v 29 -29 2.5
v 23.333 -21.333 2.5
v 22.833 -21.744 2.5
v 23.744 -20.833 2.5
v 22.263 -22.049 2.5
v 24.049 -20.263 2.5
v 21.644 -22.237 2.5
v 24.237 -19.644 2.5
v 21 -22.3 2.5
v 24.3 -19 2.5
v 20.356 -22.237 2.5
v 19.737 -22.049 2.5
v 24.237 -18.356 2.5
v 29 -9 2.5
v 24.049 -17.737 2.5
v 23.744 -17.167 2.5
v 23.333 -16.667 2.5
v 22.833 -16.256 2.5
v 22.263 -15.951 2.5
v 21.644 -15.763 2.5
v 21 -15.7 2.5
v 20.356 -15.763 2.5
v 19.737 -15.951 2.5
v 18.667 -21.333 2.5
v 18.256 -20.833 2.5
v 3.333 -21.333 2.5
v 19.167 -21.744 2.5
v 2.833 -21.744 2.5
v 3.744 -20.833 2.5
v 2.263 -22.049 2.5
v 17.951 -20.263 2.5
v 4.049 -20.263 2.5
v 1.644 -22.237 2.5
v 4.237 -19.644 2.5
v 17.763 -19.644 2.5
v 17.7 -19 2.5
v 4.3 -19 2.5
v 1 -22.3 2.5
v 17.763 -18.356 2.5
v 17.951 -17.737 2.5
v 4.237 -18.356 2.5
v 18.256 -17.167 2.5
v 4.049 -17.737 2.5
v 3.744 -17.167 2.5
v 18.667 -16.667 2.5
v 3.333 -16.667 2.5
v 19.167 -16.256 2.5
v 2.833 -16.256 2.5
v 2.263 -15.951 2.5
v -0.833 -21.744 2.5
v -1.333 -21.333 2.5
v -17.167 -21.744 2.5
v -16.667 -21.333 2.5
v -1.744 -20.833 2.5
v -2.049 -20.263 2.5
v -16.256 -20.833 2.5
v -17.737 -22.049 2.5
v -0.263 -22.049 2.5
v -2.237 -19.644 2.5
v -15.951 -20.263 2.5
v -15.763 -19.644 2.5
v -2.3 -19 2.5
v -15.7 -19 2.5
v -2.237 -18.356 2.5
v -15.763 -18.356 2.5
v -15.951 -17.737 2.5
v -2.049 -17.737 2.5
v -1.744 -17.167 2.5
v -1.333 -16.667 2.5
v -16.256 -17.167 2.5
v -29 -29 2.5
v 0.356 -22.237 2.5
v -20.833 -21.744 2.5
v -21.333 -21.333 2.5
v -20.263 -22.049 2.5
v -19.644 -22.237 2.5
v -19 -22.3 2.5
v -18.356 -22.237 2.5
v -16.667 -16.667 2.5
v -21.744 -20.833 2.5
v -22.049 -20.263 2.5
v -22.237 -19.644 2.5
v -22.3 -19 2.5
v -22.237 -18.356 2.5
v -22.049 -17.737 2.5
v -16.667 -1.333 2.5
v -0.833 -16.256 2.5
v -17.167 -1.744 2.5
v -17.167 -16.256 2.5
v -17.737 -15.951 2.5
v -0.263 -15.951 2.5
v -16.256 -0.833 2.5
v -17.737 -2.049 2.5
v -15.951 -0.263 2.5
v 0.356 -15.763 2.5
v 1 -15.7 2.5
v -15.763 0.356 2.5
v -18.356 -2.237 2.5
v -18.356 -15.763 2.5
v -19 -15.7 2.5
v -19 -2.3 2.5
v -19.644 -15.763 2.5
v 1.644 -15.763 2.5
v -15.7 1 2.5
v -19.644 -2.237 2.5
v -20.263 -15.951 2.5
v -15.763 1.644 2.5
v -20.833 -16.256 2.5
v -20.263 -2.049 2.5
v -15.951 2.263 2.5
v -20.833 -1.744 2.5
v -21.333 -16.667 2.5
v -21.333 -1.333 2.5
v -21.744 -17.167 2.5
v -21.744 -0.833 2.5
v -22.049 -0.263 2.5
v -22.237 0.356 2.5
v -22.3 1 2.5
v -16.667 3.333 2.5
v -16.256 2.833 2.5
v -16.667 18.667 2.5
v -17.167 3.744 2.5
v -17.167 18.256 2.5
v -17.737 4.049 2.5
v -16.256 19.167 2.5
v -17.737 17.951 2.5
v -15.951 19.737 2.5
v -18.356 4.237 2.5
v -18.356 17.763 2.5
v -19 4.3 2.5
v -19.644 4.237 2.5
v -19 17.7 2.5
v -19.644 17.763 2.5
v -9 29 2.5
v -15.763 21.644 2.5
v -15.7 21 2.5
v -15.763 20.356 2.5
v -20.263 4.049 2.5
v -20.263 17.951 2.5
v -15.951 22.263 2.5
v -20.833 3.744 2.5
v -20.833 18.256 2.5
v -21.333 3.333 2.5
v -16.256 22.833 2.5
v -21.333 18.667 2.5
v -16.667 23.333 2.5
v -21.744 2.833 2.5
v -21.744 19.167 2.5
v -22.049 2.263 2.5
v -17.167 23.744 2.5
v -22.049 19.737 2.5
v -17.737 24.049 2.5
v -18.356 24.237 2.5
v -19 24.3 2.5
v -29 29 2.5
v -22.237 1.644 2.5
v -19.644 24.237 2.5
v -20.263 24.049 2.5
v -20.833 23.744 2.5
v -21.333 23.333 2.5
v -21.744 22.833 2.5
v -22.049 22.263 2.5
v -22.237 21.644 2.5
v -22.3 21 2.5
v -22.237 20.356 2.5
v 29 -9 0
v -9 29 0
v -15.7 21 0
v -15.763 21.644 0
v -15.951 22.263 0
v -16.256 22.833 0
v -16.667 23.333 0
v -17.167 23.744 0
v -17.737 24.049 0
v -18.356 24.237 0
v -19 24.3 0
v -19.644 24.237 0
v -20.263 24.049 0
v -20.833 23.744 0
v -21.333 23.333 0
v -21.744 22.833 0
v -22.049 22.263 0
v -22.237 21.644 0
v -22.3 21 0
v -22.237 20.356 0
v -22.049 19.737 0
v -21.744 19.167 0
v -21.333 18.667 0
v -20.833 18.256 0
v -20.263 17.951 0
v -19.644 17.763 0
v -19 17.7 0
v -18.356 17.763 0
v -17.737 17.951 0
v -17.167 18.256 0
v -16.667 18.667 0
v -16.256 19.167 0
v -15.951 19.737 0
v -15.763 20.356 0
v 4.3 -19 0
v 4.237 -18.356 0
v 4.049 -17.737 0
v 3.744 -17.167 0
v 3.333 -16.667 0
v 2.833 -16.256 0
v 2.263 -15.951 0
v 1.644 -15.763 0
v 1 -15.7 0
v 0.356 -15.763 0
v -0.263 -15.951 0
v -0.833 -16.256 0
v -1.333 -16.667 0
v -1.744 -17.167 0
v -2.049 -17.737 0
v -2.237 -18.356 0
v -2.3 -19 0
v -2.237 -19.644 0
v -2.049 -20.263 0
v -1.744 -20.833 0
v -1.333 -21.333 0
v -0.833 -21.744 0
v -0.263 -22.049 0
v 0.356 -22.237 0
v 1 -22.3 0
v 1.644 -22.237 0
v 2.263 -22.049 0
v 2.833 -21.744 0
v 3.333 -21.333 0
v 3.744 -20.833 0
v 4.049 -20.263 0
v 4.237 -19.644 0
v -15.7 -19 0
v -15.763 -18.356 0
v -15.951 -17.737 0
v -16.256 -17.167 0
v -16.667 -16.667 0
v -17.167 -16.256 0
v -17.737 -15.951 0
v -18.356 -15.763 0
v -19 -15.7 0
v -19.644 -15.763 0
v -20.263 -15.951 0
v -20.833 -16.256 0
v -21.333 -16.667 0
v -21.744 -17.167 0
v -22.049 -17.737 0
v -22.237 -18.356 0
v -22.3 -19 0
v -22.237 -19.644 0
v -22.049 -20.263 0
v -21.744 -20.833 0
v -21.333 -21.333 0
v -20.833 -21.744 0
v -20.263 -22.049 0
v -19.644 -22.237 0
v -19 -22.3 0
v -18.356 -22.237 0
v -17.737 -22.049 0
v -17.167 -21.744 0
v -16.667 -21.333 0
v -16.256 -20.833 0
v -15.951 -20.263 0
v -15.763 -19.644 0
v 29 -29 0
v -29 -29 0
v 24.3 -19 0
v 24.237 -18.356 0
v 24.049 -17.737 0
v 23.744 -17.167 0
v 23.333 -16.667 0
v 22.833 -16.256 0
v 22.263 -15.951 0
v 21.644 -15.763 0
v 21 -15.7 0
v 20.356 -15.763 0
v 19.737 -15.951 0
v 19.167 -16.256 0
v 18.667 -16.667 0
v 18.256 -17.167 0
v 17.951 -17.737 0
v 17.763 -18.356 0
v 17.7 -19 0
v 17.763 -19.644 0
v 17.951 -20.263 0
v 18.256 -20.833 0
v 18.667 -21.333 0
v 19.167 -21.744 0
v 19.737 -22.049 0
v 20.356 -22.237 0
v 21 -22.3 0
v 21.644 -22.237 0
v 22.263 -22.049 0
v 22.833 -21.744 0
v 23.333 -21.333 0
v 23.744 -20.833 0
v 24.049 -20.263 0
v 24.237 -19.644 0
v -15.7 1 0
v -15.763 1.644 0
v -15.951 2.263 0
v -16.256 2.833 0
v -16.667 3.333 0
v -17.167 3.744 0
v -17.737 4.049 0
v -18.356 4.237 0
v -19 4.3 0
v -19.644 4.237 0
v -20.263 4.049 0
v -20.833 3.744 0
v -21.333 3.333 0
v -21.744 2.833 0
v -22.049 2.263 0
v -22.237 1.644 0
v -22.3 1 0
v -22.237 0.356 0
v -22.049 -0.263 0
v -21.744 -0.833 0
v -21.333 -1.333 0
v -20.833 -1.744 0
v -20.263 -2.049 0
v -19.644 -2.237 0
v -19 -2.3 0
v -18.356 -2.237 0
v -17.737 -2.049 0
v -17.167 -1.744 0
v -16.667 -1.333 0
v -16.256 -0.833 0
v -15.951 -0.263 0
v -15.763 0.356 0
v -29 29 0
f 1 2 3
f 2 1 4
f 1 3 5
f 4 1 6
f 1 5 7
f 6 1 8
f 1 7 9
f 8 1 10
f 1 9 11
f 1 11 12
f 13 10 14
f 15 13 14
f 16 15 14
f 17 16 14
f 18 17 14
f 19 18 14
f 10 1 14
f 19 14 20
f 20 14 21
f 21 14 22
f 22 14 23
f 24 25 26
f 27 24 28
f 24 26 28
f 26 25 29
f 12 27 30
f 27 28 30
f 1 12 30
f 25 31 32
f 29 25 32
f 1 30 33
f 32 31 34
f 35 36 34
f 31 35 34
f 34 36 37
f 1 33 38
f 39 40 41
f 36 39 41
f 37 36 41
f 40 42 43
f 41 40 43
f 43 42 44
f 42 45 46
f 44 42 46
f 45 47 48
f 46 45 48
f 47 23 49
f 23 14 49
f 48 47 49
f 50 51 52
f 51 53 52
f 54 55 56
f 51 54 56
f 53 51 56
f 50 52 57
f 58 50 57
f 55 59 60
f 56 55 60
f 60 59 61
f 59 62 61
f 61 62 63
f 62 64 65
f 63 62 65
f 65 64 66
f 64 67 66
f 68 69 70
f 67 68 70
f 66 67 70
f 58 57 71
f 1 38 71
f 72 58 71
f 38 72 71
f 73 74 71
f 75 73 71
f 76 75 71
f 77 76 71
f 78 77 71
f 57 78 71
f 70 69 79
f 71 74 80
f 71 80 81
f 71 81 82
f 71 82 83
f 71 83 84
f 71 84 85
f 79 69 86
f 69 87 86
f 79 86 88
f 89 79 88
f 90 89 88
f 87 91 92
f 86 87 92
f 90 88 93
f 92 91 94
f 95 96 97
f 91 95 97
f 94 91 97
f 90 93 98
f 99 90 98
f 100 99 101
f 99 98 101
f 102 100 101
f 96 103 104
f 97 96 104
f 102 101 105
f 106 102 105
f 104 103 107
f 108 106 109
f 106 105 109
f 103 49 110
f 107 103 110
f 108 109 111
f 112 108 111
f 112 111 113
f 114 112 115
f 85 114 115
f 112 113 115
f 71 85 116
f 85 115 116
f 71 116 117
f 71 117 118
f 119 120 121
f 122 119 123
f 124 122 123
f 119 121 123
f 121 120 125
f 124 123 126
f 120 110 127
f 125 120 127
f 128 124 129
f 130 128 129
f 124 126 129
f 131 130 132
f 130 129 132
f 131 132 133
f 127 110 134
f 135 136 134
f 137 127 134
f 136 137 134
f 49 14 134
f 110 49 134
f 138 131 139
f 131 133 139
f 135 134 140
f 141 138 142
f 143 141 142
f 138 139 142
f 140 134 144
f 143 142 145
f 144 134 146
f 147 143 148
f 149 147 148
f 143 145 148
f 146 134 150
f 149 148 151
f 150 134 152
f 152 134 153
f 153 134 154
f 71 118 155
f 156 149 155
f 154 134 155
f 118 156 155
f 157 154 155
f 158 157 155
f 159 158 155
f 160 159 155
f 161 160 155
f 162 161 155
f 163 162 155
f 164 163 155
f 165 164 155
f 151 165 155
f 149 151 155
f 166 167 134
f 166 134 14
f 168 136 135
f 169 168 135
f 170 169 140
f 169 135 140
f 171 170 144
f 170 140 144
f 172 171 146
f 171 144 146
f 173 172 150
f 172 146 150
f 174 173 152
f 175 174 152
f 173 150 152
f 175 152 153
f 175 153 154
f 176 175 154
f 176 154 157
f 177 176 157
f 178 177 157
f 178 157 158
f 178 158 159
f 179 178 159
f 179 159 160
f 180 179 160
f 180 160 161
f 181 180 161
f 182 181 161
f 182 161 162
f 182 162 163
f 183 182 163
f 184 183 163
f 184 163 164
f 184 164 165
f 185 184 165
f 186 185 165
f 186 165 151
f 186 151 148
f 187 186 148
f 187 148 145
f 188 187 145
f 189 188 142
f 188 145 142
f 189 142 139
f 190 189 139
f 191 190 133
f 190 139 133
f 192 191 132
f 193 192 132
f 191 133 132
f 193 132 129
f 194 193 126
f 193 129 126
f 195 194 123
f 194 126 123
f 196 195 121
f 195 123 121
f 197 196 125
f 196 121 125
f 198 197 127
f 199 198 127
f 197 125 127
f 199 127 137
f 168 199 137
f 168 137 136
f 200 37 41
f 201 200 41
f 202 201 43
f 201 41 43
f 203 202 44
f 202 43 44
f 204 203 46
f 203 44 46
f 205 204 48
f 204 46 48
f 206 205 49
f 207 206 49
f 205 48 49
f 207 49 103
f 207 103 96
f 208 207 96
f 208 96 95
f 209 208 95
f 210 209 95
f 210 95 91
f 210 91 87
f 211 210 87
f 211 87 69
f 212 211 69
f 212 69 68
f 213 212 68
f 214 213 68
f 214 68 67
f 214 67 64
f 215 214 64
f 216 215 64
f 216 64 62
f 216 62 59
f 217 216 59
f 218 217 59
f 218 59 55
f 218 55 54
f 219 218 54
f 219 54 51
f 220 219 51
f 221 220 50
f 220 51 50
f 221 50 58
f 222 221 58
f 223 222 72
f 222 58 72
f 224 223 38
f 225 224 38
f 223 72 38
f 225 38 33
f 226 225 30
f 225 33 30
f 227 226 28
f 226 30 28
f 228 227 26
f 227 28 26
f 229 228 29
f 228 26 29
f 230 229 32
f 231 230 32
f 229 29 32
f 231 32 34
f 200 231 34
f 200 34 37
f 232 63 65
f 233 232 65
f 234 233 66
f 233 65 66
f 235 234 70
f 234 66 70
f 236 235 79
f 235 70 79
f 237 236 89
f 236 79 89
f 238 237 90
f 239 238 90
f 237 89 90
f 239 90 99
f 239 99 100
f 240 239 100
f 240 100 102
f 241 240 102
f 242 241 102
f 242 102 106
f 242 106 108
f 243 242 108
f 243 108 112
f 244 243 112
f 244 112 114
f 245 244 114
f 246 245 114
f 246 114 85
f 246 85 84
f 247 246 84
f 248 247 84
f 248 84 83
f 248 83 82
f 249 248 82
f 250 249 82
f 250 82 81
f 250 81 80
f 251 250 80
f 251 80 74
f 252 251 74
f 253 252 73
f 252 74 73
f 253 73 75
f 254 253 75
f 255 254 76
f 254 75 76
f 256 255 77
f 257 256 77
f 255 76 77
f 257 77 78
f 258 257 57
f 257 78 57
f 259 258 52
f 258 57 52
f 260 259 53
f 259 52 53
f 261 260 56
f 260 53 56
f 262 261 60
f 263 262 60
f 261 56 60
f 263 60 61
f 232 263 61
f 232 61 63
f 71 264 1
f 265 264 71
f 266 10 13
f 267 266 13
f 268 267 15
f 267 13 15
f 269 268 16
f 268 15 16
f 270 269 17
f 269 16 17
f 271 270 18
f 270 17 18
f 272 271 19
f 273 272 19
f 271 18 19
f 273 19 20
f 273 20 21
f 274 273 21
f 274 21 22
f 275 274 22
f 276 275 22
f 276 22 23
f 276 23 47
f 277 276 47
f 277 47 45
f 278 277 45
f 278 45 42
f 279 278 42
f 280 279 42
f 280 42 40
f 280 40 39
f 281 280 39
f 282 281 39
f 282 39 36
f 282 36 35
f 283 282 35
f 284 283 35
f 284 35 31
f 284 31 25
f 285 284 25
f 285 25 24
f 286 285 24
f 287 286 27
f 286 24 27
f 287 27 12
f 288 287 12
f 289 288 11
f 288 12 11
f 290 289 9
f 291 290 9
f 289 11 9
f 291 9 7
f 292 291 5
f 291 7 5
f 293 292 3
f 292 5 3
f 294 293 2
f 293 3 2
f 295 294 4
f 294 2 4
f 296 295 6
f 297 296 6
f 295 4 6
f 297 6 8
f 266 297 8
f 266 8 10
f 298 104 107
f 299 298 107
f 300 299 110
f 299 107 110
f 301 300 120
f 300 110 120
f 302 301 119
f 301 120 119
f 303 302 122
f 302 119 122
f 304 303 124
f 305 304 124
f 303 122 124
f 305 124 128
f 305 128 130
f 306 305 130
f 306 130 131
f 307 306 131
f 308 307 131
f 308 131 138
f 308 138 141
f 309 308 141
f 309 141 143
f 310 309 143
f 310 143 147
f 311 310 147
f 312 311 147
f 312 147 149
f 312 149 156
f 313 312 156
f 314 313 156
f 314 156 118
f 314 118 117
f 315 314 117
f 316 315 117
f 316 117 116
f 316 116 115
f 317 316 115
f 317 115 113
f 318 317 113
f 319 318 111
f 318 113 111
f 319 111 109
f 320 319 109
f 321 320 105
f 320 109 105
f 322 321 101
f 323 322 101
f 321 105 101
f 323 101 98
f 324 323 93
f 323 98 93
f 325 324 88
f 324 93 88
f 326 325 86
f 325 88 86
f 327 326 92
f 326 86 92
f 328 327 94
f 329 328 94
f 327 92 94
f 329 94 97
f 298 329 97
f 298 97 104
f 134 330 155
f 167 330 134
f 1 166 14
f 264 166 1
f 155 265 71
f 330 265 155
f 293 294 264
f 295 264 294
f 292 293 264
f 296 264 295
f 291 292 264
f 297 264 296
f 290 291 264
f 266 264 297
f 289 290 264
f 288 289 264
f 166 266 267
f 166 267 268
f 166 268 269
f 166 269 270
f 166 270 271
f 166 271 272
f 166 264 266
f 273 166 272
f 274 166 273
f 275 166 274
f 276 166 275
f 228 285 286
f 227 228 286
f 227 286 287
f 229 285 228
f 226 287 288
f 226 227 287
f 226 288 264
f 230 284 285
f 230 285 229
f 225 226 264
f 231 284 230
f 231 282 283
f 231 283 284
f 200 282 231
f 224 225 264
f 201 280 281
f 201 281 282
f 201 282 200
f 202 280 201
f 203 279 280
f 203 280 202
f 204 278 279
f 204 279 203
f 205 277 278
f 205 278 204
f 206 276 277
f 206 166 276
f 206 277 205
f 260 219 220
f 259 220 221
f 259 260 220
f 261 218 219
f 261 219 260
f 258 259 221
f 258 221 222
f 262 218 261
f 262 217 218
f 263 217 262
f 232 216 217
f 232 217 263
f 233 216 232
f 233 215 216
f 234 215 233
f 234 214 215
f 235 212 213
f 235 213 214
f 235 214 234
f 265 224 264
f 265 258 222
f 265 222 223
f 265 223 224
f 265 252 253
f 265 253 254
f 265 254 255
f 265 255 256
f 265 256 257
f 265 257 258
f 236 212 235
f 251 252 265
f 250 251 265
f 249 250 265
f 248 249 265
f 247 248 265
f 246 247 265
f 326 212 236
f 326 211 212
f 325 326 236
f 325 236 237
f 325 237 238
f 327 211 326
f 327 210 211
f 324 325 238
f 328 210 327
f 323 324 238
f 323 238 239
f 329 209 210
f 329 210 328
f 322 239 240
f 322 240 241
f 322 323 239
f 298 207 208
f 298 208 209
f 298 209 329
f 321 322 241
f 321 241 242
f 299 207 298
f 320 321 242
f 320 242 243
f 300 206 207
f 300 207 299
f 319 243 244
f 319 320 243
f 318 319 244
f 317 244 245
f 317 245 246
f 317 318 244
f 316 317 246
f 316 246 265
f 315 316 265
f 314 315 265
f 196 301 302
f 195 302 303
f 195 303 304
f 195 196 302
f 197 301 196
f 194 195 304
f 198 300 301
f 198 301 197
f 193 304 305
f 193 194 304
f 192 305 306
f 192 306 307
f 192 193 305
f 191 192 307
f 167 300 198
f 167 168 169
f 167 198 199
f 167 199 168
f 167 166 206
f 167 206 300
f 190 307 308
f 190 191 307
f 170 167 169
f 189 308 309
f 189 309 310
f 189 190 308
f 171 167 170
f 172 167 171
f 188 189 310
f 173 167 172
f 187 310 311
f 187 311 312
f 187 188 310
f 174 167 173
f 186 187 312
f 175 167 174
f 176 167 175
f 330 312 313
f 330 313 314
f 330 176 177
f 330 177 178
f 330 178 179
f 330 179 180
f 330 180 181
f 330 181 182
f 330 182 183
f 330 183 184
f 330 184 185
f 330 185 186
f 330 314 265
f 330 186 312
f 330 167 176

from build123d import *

# Parameters (mm, degrees)
BOSS_EXTRUDE1_DEPTH = 2.5
SKETCH2_R           = 3.3
CUT_EXTRUDE1_DEPTH  = 3.5
LPATTERN1_COUNT     = 3
LPATTERN1_PITCH     = 20
LPATTERN2_COUNT     = 3
LPATTERN2_PITCH     = 20


with BuildPart() as part:
    # Sketch1 → Boss-Extrude1 (new body)
    with BuildSketch(Plane.XY):
        Polygon((-9, 29), (29, -9), (29, -29), (-29, -29), (-29, 29), align=None)
    extrude(amount=BOSS_EXTRUDE1_DEPTH)

    # Sketch2 → Cut-Extrude1 (cut, through all)
    with BuildSketch(Plane.XY.offset(2.5)):
        with Locations((-19, -19)):
            Circle(SKETCH2_R)
    cut_extrude1 = extrude(amount=-CUT_EXTRUDE1_DEPTH, mode=Mode.SUBTRACT)

    # LPattern1: Cut-Extrude1 ×3
    with Locations(*[(i * LPATTERN1_PITCH, 0, 0) for i in range(1, LPATTERN1_COUNT)]):
        add(cut_extrude1, mode=Mode.SUBTRACT)

    # LPattern2: Cut-Extrude1 ×3
    with Locations(*[(0, i * LPATTERN2_PITCH, 0) for i in range(1, LPATTERN2_COUNT)]):
        add(cut_extrude1, mode=Mode.SUBTRACT)


solid = part.part
